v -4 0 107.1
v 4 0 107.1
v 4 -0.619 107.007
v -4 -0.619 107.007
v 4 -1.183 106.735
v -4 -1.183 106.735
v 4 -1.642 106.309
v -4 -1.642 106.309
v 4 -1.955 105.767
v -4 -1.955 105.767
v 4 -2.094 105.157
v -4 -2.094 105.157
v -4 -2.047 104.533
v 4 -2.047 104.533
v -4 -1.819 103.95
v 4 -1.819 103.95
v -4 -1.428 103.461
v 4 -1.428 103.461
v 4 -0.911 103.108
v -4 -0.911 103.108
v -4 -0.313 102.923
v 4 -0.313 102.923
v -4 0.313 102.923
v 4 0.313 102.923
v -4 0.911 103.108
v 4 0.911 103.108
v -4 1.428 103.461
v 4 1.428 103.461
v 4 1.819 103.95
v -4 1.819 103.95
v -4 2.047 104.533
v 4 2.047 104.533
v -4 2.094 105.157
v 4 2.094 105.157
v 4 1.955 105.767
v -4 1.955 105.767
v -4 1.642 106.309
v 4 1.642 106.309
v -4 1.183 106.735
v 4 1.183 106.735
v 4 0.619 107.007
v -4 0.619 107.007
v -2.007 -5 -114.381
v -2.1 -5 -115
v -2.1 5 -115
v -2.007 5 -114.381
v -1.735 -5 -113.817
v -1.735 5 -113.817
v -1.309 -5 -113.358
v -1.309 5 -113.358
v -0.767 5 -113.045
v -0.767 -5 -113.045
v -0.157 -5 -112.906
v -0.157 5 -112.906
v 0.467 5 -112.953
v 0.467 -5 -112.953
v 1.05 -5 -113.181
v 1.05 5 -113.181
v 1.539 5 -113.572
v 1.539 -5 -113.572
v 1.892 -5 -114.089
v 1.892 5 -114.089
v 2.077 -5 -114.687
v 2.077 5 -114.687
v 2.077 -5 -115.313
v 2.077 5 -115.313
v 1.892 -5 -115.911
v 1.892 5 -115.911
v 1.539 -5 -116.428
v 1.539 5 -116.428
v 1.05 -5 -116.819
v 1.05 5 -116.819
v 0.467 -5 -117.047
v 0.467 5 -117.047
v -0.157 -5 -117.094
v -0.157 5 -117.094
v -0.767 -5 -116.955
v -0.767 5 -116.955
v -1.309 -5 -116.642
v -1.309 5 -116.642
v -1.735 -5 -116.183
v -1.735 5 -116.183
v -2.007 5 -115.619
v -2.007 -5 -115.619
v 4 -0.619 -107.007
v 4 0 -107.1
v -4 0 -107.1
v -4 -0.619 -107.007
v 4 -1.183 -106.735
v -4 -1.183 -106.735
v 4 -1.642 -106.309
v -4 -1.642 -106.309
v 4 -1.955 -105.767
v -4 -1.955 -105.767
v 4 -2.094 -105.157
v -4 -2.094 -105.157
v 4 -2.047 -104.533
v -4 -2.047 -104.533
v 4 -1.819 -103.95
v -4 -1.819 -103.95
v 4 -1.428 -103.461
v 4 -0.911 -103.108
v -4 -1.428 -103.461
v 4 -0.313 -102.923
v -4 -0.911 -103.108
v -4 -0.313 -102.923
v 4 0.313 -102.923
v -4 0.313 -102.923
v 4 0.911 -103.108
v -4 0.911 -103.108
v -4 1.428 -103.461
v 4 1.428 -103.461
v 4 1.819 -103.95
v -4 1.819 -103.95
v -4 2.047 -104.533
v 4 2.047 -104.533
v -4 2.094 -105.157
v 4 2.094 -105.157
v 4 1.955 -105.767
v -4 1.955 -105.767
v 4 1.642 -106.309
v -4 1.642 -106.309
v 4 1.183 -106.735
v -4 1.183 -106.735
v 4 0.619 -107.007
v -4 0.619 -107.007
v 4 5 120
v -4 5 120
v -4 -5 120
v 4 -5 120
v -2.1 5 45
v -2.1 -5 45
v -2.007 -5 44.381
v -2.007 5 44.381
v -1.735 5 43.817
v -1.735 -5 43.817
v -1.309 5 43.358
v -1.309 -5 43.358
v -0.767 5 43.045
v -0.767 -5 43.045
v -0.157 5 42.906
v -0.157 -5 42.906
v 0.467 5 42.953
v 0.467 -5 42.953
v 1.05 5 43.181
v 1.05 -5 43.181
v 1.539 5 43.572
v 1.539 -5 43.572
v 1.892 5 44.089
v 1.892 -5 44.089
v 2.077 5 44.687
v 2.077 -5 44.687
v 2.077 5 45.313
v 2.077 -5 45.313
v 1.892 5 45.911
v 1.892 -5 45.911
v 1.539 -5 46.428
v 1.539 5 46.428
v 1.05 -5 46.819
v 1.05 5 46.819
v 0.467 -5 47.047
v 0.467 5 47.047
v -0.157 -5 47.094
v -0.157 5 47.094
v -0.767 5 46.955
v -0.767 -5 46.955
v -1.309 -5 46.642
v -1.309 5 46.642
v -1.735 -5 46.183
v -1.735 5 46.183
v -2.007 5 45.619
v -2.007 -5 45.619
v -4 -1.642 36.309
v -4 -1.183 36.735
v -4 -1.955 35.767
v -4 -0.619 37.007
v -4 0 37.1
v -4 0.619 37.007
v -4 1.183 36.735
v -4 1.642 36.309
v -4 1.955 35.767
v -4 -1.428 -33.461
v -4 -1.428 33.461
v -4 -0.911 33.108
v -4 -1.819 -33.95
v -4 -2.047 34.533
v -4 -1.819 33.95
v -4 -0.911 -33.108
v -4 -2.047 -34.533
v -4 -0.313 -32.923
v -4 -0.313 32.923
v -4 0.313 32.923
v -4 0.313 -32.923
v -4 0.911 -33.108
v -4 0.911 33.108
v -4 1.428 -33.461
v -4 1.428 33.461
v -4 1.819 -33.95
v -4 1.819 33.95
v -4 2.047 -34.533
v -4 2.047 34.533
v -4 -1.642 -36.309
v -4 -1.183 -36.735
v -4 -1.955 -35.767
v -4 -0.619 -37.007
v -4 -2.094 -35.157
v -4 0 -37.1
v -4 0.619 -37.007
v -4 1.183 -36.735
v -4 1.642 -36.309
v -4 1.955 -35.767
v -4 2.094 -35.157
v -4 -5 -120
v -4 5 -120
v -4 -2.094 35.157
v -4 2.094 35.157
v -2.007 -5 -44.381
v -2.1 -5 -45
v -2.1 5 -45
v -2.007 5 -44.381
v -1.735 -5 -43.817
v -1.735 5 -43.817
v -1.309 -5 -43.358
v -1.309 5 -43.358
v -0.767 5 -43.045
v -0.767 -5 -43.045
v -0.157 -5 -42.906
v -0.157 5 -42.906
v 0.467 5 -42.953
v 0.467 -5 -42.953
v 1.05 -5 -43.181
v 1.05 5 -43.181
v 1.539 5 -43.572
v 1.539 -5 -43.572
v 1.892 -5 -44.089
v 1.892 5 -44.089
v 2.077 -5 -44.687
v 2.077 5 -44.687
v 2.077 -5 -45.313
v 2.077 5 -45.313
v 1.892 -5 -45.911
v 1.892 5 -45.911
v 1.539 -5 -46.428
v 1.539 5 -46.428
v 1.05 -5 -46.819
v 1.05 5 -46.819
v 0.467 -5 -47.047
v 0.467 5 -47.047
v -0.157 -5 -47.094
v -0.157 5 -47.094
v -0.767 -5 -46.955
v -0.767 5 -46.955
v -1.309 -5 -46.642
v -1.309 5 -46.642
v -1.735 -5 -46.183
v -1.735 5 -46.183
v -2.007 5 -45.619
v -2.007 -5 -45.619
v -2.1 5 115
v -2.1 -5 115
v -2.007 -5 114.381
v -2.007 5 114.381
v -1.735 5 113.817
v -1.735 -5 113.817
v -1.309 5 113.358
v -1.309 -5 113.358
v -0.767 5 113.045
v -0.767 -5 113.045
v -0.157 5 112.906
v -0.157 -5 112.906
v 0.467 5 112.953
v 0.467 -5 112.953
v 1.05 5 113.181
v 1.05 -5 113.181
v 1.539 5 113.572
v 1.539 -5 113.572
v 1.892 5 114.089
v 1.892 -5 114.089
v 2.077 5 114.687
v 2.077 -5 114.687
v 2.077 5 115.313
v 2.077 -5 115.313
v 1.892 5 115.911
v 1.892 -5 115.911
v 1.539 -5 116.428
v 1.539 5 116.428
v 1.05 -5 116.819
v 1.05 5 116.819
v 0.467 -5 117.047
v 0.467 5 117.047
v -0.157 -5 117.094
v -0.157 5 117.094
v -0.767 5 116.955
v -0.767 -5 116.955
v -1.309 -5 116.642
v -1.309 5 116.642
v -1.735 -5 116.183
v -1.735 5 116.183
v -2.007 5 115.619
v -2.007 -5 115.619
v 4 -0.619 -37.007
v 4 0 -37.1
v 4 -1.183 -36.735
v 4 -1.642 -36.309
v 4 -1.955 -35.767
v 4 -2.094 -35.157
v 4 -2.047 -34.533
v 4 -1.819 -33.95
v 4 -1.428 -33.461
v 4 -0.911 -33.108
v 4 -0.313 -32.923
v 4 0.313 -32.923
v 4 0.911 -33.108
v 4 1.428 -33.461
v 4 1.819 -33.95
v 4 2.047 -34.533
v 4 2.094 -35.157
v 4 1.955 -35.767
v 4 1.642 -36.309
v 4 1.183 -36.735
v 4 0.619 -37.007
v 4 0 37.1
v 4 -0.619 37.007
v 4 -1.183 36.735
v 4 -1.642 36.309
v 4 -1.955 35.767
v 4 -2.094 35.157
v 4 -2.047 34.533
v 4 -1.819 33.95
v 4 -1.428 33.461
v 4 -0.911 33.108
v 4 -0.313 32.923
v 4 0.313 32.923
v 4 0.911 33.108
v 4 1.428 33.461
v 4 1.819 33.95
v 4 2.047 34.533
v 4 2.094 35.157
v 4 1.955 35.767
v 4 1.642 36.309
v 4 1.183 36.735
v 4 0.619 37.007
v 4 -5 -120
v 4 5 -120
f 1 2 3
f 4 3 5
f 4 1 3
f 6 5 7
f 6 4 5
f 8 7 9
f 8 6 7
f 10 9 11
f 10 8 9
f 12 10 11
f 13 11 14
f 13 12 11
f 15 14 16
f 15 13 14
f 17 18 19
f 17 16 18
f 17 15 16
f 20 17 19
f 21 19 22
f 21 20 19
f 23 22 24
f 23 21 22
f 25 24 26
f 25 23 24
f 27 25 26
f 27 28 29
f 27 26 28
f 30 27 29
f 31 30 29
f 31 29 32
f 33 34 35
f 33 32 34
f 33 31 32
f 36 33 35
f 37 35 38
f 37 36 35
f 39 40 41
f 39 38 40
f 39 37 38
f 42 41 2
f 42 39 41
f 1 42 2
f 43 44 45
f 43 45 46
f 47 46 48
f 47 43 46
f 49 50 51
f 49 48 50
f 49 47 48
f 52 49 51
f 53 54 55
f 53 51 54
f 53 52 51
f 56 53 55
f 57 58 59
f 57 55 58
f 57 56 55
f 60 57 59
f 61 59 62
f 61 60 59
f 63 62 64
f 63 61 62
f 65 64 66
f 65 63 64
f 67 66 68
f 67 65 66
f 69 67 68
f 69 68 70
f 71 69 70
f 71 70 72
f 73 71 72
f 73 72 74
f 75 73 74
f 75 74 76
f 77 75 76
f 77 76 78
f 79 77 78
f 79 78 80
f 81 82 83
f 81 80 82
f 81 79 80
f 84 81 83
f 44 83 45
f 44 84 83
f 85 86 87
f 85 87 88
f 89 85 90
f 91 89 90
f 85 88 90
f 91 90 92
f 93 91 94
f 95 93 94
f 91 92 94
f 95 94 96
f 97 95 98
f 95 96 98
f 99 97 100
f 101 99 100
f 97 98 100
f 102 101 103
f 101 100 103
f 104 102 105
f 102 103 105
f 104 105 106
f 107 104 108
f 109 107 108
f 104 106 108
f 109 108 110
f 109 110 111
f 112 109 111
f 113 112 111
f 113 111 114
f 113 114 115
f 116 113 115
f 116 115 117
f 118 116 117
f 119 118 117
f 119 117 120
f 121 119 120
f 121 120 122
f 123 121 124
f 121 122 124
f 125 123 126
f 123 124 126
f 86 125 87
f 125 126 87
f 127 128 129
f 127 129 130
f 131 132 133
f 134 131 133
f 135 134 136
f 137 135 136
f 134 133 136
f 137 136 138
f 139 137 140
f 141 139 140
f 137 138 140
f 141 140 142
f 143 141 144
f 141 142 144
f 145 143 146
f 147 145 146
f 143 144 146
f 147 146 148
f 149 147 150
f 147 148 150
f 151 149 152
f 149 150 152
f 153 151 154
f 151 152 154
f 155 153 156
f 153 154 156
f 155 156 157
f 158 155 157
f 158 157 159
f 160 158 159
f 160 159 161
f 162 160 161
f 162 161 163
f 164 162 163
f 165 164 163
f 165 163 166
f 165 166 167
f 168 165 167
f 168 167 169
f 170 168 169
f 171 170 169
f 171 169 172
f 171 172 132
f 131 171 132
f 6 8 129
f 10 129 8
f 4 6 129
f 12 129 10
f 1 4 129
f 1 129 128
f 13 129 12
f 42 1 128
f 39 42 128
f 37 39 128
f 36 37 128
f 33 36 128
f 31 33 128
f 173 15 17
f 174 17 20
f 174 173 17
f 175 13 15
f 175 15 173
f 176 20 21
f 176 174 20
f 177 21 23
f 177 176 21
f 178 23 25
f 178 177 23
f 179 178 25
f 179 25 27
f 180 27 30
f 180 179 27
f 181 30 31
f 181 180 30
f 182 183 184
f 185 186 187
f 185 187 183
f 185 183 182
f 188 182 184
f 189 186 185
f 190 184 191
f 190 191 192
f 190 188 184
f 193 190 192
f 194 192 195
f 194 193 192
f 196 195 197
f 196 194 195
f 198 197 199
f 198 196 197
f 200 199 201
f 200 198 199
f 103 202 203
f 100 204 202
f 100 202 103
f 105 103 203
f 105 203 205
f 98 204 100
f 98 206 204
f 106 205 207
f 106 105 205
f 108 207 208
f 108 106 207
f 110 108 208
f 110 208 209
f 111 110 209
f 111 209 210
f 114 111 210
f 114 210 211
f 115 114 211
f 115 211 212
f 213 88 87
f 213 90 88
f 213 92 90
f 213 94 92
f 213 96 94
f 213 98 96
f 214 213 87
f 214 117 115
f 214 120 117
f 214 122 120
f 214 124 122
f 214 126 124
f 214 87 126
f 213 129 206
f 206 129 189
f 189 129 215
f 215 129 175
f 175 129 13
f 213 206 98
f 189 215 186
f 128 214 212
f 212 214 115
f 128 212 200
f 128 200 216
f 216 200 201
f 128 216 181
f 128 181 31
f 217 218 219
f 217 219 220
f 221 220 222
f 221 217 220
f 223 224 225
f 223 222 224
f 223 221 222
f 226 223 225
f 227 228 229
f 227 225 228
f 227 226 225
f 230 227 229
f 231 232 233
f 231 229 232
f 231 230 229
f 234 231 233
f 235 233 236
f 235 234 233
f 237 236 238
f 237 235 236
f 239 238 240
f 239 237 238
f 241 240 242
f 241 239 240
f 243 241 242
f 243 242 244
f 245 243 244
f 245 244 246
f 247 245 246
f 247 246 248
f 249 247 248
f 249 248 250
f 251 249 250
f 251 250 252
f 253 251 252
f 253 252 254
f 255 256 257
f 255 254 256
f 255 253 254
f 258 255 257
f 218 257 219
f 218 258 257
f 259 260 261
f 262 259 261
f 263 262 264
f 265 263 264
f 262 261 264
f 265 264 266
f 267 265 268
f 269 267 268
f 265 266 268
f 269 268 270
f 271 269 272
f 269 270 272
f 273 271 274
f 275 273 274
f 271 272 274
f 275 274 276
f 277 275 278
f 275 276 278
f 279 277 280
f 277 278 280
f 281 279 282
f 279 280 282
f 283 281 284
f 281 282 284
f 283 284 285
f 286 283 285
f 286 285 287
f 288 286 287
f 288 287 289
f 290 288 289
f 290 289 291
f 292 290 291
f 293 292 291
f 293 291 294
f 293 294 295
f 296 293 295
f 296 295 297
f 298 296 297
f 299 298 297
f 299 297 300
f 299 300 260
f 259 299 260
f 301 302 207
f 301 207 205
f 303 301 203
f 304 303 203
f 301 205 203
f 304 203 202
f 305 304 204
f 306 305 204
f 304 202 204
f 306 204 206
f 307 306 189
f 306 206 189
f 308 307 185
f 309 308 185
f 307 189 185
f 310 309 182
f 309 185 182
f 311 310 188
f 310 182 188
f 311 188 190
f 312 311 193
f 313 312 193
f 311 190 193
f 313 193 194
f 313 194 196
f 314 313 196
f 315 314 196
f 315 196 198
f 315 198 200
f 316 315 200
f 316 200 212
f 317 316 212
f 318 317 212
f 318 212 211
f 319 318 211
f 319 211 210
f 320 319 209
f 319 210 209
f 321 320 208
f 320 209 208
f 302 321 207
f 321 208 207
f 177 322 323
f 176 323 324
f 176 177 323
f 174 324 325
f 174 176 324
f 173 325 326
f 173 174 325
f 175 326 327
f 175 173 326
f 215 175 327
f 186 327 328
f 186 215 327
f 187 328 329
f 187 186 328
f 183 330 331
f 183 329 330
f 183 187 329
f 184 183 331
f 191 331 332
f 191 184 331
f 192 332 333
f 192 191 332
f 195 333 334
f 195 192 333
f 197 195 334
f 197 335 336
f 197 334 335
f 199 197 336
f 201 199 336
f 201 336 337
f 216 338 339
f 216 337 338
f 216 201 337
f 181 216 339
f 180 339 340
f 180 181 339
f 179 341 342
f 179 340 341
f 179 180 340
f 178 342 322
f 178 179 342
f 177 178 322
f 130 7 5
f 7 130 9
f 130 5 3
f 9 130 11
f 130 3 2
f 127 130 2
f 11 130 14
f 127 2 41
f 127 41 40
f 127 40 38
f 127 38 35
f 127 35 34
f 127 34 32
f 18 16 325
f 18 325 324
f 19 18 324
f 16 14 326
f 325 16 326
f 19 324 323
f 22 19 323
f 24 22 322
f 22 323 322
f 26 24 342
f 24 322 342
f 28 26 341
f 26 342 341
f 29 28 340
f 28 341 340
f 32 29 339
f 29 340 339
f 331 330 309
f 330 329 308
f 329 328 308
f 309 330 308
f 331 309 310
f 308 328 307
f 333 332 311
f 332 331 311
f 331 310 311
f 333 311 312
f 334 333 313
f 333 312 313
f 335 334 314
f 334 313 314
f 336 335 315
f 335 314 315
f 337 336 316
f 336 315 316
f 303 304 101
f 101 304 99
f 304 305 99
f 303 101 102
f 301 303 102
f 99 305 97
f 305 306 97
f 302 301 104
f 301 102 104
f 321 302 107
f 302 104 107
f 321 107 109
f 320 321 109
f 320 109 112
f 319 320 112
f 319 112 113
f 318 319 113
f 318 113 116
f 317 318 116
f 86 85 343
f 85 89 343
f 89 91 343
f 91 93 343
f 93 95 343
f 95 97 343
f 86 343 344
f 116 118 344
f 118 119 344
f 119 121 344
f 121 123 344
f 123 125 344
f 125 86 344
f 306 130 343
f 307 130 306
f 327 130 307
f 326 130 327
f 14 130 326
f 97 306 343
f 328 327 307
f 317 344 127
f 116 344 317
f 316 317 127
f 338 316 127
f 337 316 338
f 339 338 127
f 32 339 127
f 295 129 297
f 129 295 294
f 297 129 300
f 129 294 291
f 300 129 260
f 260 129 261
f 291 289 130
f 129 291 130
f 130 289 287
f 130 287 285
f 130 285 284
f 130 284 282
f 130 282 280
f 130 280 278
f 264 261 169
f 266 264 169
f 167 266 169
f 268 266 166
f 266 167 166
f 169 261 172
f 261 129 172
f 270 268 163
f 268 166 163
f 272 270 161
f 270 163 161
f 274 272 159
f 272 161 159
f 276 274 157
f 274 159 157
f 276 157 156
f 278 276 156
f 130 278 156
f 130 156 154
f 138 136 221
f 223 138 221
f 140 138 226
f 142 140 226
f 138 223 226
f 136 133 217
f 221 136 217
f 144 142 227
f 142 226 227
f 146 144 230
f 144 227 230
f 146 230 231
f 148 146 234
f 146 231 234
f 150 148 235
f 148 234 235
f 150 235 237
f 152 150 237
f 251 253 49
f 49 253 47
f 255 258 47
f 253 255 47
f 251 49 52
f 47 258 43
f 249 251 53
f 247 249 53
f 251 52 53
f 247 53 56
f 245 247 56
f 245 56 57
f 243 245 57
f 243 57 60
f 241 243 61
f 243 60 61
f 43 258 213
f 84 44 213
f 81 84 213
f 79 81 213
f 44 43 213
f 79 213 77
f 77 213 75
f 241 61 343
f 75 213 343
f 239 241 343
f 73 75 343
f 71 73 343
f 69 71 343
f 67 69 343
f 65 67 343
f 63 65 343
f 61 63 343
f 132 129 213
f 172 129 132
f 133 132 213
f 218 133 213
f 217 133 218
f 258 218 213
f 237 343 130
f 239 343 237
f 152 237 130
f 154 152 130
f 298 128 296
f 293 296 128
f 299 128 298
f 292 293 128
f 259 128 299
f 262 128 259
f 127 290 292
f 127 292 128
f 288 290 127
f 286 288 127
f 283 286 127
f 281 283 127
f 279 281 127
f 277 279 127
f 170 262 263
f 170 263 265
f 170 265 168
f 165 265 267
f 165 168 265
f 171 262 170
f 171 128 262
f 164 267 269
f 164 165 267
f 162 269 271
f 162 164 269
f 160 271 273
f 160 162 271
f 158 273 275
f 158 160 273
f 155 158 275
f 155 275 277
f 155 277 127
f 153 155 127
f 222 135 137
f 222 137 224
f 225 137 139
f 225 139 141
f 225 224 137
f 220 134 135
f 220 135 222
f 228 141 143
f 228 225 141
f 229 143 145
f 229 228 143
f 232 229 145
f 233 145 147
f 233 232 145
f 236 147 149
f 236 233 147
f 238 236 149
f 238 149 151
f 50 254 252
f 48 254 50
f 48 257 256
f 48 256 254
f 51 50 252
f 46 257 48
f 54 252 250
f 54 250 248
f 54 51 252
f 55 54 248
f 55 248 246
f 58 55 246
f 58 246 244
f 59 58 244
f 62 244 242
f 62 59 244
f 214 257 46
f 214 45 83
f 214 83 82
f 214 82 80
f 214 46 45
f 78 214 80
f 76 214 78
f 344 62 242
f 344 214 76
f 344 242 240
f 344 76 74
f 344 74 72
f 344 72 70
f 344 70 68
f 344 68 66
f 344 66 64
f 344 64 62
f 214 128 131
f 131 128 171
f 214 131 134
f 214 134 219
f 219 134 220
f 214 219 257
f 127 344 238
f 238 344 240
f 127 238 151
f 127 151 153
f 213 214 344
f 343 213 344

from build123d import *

# Parameters (mm, degrees)
AUFSATZ_LINEAR_AUSTRAGEN1_DEPTH           = 120
AUFSATZ_LINEAR_AUSTRAGEN1_DEPTH_BACK      = 120
SKIZZE1_W                                 = 8
SKIZZE1_H                                 = 10
M5_GEWINDEBOHRUNG1_D                      = 4.2
F_4_2_4_2_DURCHMESSER_BOHRUNG1_AT_2_COUNT = 2
F_4_2_4_2_DURCHMESSER_BOHRUNG1_AT_2_PITCH = 70


with BuildPart() as part:
    # Skizze1 → Aufsatz-Linear austragen1 (new, two sides: drawn at the far end of the back side and taken through both)
    with BuildSketch(Plane.XY.offset(-AUFSATZ_LINEAR_AUSTRAGEN1_DEPTH_BACK)):
        Rectangle(SKIZZE1_W, SKIZZE1_H)
    extrude(amount=AUFSATZ_LINEAR_AUSTRAGEN1_DEPTH + AUFSATZ_LINEAR_AUSTRAGEN1_DEPTH_BACK)

    # M5 Gewindebohrung1 (through all)
    with Locations(Plane(origin=(0, 5, 0), x_dir=(1, 0, 0), z_dir=(0, 1, 0))):
        with Locations((0, -115), (0, -45)):
            m5_gewindebohrung1 = Hole(M5_GEWINDEBOHRUNG1_D / 2)

    # Skizze4 → Ø4.2 (4.2) Durchmesser Bohrung1 (revolve, cut)
    with BuildSketch(Plane(origin=(-4, 0, 105), x_dir=(0, 0, 1), z_dir=(0, 1, 0))):
        Polygon((0, 0), (0, 11.2618073), (2.1, 10), (2.1, 0), align=None)
    f_4_2_4_2_durchmesser_bohrung1 = revolve(axis=Axis((-10.35, 0, 105), (1, 0, 0)), mode=Mode.SUBTRACT)

    # Ø4.2 (4.2) Durchmesser Bohrung1 at 2: Ø4.2 (4.2) Durchmesser Bohrung1 ×2
    with Locations(*[(0, 0, -i * F_4_2_4_2_DURCHMESSER_BOHRUNG1_AT_2_PITCH) for i in range(1, F_4_2_4_2_DURCHMESSER_BOHRUNG1_AT_2_COUNT)]):
        add(f_4_2_4_2_durchmesser_bohrung1, mode=Mode.SUBTRACT)

    # Spiegeln1: M5 Gewindebohrung1, Ø4.2 (4.2) Durchmesser Bohrung1 across plane
    add(m5_gewindebohrung1.mirror(Plane.XY), mode=Mode.SUBTRACT)
    add(f_4_2_4_2_durchmesser_bohrung1.mirror(Plane.XY), mode=Mode.SUBTRACT)

    # Spiegeln1 copy 1 sketch → Spiegeln1 copy 1 (revolve, cut)
    with BuildSketch(Plane(origin=(-4, 0, -35), x_dir=(0, 0, -1), z_dir=(0, 1, 0))):
        Polygon((0, 0), (0, -11.2618073), (2.1, -10), (2.1, 0), align=None)
    revolve(axis=Axis((-10.35, 0, -35), (-1, 0, 0)), mode=Mode.SUBTRACT)


solid = part.part
